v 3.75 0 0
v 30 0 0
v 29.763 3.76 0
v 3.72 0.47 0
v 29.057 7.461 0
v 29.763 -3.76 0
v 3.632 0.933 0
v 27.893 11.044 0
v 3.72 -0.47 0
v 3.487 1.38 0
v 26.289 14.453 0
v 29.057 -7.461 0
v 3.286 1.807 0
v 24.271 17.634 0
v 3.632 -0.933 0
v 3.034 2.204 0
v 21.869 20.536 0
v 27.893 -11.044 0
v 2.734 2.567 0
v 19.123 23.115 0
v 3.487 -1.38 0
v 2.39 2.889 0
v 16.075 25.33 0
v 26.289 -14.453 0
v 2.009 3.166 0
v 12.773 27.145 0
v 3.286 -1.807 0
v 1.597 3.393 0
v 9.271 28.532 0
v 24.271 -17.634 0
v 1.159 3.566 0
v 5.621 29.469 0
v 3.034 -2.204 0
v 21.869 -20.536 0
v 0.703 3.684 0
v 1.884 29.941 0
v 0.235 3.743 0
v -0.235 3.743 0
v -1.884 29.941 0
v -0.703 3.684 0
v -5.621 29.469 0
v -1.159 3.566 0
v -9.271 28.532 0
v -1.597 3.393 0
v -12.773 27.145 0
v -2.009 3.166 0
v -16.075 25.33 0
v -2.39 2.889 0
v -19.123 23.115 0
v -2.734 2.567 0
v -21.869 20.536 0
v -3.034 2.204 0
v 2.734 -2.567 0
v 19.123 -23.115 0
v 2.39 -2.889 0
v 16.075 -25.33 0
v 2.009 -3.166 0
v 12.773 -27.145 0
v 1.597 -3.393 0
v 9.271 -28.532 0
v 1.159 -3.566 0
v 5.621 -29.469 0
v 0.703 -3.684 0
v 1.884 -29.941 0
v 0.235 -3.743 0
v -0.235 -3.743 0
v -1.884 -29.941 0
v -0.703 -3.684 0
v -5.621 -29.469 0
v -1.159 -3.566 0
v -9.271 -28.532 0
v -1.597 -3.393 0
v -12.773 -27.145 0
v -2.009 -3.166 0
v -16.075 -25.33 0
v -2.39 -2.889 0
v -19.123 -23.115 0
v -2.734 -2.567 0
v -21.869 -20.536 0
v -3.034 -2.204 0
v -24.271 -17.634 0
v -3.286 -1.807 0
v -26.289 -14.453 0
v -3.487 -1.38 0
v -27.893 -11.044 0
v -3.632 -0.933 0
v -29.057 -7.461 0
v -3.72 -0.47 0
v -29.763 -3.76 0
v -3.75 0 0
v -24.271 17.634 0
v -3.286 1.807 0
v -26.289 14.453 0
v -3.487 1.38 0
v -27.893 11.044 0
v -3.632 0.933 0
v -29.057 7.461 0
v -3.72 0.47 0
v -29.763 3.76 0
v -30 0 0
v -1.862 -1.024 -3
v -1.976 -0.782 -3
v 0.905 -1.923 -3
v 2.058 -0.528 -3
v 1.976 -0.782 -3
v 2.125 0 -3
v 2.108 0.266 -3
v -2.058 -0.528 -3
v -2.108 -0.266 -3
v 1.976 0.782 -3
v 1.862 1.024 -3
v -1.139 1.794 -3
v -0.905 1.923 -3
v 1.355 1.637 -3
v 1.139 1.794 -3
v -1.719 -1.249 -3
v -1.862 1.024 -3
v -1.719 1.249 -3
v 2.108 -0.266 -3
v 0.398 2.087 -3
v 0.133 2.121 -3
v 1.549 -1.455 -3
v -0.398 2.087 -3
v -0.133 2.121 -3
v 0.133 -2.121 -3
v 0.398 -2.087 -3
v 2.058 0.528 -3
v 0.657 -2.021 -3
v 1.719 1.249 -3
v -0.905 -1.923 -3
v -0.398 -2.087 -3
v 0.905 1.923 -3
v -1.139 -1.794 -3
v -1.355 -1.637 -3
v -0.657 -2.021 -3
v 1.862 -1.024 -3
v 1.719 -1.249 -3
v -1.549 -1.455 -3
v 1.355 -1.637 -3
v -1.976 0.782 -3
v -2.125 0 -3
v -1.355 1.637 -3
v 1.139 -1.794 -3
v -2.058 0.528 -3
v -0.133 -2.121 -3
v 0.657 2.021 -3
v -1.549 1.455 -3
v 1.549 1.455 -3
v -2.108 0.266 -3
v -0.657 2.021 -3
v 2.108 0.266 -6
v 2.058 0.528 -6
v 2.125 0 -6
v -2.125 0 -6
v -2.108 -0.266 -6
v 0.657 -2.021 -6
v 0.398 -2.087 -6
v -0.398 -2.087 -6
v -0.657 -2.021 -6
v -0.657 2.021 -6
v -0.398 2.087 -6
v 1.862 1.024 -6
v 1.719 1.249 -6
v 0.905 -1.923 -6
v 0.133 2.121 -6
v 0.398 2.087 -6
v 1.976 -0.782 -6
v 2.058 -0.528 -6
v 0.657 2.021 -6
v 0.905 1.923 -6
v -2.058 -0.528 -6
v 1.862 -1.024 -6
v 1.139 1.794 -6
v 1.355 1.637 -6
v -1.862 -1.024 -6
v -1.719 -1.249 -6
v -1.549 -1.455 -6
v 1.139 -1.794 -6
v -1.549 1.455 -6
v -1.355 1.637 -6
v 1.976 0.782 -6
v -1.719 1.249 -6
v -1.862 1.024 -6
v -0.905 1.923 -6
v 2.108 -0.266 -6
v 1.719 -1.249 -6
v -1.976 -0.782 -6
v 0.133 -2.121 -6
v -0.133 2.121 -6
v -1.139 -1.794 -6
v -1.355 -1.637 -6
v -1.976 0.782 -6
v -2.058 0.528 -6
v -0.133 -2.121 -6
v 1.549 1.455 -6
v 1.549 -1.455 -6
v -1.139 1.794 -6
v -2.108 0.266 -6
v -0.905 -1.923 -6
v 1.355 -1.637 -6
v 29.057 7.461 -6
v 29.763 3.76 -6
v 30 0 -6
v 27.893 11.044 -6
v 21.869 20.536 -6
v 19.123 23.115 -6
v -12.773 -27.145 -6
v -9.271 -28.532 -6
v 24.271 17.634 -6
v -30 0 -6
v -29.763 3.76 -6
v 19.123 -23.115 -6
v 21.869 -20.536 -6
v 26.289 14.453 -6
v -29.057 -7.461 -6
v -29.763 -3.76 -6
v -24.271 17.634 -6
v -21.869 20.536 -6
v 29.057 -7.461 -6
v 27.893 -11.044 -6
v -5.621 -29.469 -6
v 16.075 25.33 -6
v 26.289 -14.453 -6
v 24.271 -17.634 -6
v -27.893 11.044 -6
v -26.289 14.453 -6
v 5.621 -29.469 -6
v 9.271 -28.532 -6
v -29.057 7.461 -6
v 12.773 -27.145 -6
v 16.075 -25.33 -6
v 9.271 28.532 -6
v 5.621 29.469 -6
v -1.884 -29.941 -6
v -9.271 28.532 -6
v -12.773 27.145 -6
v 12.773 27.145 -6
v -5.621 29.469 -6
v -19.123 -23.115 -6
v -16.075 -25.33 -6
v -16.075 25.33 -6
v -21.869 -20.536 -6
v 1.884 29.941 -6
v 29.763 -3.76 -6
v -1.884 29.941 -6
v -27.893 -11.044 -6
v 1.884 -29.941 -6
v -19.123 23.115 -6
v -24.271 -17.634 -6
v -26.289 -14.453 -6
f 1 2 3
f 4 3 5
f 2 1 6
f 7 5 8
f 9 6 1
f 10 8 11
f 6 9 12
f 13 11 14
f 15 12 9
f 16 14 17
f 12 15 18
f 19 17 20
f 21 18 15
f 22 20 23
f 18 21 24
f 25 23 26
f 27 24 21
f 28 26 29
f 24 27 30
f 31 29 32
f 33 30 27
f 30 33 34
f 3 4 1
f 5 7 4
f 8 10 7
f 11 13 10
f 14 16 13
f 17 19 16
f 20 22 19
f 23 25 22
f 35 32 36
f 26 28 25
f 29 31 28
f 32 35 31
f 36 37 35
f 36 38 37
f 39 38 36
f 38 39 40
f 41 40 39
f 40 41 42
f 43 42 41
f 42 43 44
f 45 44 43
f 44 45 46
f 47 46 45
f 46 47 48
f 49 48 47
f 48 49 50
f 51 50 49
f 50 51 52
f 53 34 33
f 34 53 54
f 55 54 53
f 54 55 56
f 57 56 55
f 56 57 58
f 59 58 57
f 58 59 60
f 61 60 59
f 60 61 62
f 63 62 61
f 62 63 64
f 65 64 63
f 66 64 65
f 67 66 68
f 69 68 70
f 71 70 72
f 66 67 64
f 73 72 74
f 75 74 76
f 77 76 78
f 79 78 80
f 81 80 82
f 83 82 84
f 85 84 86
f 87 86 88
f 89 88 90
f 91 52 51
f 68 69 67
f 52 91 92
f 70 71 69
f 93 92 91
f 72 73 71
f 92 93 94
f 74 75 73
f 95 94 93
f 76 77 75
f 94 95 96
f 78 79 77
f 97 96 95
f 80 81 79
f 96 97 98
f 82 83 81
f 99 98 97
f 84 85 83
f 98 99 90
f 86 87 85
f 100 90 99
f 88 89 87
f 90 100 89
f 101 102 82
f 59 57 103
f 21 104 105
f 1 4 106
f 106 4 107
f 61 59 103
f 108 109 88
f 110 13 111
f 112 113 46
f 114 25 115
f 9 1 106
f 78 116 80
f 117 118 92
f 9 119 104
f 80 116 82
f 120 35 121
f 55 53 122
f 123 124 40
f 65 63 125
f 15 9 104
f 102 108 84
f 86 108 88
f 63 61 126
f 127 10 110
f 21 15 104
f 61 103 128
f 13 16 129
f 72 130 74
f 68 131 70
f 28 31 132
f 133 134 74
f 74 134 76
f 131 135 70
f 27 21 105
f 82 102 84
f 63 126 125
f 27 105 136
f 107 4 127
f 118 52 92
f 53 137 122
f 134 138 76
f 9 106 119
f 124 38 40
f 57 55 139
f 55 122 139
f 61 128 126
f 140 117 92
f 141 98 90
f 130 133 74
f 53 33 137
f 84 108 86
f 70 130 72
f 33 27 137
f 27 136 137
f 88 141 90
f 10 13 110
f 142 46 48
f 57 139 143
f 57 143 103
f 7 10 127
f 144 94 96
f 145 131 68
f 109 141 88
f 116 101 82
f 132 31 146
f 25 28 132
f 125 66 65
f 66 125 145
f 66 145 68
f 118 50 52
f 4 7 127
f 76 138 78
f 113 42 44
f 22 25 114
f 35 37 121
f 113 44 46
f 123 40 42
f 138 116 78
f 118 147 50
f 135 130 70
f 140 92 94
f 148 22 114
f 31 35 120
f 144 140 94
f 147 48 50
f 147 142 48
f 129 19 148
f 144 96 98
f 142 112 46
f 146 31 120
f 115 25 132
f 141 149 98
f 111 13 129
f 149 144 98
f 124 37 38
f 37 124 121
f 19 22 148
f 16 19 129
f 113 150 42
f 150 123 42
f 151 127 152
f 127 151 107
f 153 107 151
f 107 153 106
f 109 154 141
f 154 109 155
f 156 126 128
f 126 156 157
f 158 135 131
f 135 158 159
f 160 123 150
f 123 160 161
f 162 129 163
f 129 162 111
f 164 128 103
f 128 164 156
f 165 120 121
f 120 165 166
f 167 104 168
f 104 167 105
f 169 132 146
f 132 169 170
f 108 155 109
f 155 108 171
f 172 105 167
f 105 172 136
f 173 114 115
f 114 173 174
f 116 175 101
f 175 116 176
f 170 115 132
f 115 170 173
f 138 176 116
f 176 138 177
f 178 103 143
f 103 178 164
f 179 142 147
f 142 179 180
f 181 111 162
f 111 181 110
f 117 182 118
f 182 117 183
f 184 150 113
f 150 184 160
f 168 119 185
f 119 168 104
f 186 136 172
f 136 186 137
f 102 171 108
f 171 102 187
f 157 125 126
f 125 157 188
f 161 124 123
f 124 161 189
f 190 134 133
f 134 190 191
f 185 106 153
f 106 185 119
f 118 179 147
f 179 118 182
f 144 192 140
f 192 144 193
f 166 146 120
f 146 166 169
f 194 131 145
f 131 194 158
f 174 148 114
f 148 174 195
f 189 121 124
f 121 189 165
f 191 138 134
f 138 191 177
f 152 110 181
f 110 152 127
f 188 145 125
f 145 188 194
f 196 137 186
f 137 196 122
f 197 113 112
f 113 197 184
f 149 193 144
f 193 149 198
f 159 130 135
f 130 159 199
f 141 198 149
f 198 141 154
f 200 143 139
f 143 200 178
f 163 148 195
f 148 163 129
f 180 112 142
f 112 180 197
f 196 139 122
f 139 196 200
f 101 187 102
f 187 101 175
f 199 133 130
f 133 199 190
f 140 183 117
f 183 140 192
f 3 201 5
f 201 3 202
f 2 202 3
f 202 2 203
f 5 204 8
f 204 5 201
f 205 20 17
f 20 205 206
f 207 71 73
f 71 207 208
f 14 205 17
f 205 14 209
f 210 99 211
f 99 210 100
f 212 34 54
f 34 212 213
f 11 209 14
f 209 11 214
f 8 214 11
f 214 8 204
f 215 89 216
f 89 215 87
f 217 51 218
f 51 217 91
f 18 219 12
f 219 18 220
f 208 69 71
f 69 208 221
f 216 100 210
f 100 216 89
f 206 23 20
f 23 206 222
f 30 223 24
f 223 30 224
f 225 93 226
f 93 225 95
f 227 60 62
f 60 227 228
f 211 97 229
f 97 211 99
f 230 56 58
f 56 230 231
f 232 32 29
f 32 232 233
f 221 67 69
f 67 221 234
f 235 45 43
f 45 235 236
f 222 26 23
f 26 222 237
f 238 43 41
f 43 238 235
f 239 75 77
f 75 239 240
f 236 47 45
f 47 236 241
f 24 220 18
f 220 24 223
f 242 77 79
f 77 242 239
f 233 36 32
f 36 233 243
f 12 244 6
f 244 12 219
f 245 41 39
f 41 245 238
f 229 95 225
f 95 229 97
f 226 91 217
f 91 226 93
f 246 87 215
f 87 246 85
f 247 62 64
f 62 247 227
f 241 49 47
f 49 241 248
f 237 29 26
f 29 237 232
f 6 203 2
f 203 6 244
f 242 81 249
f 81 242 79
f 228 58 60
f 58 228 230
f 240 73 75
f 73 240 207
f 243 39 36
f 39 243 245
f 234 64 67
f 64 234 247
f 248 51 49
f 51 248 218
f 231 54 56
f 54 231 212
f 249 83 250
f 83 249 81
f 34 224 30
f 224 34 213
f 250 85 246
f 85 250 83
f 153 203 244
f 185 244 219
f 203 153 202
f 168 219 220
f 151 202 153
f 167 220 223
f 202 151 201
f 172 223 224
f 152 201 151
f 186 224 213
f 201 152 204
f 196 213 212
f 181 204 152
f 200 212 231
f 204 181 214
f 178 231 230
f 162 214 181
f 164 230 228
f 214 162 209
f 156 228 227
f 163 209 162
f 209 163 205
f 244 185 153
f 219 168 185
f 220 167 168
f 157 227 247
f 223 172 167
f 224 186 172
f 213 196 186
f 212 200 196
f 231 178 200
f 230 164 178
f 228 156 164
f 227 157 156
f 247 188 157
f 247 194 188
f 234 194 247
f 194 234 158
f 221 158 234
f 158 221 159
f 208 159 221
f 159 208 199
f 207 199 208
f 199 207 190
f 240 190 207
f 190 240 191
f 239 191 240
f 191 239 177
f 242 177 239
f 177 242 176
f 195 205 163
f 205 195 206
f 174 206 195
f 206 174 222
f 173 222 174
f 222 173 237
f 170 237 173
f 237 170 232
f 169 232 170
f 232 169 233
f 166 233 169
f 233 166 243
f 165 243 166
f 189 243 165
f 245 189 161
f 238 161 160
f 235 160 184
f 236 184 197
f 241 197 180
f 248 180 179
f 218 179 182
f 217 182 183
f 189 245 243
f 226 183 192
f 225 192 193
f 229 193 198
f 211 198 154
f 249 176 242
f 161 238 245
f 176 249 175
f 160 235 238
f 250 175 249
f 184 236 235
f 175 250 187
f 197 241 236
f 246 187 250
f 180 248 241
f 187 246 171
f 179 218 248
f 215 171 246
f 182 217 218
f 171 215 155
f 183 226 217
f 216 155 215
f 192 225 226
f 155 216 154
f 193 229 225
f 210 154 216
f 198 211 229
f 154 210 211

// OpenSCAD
$fn = 50;

difference() {
	union() {
		translate(v = [0, 0, -6.0]) {
			cylinder(h = 6, r = 30.0);
		}
	}
	union() {
		translate(v = [0, 0, 0]) {
			rotate(a = [0, 0, 0]) {
				difference() {
					union() {
						translate(v = [0, 0, -9.0]) {
							cylinder(h = 9, r = 2.0);
						}
						translate(v = [0, 0, -3]) {
							cylinder(h = 3, r1 = 2.125, r2 = 3.75);
						}
						translate(v = [0, 0, -9.0]) {
							cylinder(h = 9, r = 2.125);
						}
						translate(v = [0, 0, -9.0]) {
							cylinder(h = 9, r = 2.0);
						}
					}
					union();
				}
			}
		}
	}
}
